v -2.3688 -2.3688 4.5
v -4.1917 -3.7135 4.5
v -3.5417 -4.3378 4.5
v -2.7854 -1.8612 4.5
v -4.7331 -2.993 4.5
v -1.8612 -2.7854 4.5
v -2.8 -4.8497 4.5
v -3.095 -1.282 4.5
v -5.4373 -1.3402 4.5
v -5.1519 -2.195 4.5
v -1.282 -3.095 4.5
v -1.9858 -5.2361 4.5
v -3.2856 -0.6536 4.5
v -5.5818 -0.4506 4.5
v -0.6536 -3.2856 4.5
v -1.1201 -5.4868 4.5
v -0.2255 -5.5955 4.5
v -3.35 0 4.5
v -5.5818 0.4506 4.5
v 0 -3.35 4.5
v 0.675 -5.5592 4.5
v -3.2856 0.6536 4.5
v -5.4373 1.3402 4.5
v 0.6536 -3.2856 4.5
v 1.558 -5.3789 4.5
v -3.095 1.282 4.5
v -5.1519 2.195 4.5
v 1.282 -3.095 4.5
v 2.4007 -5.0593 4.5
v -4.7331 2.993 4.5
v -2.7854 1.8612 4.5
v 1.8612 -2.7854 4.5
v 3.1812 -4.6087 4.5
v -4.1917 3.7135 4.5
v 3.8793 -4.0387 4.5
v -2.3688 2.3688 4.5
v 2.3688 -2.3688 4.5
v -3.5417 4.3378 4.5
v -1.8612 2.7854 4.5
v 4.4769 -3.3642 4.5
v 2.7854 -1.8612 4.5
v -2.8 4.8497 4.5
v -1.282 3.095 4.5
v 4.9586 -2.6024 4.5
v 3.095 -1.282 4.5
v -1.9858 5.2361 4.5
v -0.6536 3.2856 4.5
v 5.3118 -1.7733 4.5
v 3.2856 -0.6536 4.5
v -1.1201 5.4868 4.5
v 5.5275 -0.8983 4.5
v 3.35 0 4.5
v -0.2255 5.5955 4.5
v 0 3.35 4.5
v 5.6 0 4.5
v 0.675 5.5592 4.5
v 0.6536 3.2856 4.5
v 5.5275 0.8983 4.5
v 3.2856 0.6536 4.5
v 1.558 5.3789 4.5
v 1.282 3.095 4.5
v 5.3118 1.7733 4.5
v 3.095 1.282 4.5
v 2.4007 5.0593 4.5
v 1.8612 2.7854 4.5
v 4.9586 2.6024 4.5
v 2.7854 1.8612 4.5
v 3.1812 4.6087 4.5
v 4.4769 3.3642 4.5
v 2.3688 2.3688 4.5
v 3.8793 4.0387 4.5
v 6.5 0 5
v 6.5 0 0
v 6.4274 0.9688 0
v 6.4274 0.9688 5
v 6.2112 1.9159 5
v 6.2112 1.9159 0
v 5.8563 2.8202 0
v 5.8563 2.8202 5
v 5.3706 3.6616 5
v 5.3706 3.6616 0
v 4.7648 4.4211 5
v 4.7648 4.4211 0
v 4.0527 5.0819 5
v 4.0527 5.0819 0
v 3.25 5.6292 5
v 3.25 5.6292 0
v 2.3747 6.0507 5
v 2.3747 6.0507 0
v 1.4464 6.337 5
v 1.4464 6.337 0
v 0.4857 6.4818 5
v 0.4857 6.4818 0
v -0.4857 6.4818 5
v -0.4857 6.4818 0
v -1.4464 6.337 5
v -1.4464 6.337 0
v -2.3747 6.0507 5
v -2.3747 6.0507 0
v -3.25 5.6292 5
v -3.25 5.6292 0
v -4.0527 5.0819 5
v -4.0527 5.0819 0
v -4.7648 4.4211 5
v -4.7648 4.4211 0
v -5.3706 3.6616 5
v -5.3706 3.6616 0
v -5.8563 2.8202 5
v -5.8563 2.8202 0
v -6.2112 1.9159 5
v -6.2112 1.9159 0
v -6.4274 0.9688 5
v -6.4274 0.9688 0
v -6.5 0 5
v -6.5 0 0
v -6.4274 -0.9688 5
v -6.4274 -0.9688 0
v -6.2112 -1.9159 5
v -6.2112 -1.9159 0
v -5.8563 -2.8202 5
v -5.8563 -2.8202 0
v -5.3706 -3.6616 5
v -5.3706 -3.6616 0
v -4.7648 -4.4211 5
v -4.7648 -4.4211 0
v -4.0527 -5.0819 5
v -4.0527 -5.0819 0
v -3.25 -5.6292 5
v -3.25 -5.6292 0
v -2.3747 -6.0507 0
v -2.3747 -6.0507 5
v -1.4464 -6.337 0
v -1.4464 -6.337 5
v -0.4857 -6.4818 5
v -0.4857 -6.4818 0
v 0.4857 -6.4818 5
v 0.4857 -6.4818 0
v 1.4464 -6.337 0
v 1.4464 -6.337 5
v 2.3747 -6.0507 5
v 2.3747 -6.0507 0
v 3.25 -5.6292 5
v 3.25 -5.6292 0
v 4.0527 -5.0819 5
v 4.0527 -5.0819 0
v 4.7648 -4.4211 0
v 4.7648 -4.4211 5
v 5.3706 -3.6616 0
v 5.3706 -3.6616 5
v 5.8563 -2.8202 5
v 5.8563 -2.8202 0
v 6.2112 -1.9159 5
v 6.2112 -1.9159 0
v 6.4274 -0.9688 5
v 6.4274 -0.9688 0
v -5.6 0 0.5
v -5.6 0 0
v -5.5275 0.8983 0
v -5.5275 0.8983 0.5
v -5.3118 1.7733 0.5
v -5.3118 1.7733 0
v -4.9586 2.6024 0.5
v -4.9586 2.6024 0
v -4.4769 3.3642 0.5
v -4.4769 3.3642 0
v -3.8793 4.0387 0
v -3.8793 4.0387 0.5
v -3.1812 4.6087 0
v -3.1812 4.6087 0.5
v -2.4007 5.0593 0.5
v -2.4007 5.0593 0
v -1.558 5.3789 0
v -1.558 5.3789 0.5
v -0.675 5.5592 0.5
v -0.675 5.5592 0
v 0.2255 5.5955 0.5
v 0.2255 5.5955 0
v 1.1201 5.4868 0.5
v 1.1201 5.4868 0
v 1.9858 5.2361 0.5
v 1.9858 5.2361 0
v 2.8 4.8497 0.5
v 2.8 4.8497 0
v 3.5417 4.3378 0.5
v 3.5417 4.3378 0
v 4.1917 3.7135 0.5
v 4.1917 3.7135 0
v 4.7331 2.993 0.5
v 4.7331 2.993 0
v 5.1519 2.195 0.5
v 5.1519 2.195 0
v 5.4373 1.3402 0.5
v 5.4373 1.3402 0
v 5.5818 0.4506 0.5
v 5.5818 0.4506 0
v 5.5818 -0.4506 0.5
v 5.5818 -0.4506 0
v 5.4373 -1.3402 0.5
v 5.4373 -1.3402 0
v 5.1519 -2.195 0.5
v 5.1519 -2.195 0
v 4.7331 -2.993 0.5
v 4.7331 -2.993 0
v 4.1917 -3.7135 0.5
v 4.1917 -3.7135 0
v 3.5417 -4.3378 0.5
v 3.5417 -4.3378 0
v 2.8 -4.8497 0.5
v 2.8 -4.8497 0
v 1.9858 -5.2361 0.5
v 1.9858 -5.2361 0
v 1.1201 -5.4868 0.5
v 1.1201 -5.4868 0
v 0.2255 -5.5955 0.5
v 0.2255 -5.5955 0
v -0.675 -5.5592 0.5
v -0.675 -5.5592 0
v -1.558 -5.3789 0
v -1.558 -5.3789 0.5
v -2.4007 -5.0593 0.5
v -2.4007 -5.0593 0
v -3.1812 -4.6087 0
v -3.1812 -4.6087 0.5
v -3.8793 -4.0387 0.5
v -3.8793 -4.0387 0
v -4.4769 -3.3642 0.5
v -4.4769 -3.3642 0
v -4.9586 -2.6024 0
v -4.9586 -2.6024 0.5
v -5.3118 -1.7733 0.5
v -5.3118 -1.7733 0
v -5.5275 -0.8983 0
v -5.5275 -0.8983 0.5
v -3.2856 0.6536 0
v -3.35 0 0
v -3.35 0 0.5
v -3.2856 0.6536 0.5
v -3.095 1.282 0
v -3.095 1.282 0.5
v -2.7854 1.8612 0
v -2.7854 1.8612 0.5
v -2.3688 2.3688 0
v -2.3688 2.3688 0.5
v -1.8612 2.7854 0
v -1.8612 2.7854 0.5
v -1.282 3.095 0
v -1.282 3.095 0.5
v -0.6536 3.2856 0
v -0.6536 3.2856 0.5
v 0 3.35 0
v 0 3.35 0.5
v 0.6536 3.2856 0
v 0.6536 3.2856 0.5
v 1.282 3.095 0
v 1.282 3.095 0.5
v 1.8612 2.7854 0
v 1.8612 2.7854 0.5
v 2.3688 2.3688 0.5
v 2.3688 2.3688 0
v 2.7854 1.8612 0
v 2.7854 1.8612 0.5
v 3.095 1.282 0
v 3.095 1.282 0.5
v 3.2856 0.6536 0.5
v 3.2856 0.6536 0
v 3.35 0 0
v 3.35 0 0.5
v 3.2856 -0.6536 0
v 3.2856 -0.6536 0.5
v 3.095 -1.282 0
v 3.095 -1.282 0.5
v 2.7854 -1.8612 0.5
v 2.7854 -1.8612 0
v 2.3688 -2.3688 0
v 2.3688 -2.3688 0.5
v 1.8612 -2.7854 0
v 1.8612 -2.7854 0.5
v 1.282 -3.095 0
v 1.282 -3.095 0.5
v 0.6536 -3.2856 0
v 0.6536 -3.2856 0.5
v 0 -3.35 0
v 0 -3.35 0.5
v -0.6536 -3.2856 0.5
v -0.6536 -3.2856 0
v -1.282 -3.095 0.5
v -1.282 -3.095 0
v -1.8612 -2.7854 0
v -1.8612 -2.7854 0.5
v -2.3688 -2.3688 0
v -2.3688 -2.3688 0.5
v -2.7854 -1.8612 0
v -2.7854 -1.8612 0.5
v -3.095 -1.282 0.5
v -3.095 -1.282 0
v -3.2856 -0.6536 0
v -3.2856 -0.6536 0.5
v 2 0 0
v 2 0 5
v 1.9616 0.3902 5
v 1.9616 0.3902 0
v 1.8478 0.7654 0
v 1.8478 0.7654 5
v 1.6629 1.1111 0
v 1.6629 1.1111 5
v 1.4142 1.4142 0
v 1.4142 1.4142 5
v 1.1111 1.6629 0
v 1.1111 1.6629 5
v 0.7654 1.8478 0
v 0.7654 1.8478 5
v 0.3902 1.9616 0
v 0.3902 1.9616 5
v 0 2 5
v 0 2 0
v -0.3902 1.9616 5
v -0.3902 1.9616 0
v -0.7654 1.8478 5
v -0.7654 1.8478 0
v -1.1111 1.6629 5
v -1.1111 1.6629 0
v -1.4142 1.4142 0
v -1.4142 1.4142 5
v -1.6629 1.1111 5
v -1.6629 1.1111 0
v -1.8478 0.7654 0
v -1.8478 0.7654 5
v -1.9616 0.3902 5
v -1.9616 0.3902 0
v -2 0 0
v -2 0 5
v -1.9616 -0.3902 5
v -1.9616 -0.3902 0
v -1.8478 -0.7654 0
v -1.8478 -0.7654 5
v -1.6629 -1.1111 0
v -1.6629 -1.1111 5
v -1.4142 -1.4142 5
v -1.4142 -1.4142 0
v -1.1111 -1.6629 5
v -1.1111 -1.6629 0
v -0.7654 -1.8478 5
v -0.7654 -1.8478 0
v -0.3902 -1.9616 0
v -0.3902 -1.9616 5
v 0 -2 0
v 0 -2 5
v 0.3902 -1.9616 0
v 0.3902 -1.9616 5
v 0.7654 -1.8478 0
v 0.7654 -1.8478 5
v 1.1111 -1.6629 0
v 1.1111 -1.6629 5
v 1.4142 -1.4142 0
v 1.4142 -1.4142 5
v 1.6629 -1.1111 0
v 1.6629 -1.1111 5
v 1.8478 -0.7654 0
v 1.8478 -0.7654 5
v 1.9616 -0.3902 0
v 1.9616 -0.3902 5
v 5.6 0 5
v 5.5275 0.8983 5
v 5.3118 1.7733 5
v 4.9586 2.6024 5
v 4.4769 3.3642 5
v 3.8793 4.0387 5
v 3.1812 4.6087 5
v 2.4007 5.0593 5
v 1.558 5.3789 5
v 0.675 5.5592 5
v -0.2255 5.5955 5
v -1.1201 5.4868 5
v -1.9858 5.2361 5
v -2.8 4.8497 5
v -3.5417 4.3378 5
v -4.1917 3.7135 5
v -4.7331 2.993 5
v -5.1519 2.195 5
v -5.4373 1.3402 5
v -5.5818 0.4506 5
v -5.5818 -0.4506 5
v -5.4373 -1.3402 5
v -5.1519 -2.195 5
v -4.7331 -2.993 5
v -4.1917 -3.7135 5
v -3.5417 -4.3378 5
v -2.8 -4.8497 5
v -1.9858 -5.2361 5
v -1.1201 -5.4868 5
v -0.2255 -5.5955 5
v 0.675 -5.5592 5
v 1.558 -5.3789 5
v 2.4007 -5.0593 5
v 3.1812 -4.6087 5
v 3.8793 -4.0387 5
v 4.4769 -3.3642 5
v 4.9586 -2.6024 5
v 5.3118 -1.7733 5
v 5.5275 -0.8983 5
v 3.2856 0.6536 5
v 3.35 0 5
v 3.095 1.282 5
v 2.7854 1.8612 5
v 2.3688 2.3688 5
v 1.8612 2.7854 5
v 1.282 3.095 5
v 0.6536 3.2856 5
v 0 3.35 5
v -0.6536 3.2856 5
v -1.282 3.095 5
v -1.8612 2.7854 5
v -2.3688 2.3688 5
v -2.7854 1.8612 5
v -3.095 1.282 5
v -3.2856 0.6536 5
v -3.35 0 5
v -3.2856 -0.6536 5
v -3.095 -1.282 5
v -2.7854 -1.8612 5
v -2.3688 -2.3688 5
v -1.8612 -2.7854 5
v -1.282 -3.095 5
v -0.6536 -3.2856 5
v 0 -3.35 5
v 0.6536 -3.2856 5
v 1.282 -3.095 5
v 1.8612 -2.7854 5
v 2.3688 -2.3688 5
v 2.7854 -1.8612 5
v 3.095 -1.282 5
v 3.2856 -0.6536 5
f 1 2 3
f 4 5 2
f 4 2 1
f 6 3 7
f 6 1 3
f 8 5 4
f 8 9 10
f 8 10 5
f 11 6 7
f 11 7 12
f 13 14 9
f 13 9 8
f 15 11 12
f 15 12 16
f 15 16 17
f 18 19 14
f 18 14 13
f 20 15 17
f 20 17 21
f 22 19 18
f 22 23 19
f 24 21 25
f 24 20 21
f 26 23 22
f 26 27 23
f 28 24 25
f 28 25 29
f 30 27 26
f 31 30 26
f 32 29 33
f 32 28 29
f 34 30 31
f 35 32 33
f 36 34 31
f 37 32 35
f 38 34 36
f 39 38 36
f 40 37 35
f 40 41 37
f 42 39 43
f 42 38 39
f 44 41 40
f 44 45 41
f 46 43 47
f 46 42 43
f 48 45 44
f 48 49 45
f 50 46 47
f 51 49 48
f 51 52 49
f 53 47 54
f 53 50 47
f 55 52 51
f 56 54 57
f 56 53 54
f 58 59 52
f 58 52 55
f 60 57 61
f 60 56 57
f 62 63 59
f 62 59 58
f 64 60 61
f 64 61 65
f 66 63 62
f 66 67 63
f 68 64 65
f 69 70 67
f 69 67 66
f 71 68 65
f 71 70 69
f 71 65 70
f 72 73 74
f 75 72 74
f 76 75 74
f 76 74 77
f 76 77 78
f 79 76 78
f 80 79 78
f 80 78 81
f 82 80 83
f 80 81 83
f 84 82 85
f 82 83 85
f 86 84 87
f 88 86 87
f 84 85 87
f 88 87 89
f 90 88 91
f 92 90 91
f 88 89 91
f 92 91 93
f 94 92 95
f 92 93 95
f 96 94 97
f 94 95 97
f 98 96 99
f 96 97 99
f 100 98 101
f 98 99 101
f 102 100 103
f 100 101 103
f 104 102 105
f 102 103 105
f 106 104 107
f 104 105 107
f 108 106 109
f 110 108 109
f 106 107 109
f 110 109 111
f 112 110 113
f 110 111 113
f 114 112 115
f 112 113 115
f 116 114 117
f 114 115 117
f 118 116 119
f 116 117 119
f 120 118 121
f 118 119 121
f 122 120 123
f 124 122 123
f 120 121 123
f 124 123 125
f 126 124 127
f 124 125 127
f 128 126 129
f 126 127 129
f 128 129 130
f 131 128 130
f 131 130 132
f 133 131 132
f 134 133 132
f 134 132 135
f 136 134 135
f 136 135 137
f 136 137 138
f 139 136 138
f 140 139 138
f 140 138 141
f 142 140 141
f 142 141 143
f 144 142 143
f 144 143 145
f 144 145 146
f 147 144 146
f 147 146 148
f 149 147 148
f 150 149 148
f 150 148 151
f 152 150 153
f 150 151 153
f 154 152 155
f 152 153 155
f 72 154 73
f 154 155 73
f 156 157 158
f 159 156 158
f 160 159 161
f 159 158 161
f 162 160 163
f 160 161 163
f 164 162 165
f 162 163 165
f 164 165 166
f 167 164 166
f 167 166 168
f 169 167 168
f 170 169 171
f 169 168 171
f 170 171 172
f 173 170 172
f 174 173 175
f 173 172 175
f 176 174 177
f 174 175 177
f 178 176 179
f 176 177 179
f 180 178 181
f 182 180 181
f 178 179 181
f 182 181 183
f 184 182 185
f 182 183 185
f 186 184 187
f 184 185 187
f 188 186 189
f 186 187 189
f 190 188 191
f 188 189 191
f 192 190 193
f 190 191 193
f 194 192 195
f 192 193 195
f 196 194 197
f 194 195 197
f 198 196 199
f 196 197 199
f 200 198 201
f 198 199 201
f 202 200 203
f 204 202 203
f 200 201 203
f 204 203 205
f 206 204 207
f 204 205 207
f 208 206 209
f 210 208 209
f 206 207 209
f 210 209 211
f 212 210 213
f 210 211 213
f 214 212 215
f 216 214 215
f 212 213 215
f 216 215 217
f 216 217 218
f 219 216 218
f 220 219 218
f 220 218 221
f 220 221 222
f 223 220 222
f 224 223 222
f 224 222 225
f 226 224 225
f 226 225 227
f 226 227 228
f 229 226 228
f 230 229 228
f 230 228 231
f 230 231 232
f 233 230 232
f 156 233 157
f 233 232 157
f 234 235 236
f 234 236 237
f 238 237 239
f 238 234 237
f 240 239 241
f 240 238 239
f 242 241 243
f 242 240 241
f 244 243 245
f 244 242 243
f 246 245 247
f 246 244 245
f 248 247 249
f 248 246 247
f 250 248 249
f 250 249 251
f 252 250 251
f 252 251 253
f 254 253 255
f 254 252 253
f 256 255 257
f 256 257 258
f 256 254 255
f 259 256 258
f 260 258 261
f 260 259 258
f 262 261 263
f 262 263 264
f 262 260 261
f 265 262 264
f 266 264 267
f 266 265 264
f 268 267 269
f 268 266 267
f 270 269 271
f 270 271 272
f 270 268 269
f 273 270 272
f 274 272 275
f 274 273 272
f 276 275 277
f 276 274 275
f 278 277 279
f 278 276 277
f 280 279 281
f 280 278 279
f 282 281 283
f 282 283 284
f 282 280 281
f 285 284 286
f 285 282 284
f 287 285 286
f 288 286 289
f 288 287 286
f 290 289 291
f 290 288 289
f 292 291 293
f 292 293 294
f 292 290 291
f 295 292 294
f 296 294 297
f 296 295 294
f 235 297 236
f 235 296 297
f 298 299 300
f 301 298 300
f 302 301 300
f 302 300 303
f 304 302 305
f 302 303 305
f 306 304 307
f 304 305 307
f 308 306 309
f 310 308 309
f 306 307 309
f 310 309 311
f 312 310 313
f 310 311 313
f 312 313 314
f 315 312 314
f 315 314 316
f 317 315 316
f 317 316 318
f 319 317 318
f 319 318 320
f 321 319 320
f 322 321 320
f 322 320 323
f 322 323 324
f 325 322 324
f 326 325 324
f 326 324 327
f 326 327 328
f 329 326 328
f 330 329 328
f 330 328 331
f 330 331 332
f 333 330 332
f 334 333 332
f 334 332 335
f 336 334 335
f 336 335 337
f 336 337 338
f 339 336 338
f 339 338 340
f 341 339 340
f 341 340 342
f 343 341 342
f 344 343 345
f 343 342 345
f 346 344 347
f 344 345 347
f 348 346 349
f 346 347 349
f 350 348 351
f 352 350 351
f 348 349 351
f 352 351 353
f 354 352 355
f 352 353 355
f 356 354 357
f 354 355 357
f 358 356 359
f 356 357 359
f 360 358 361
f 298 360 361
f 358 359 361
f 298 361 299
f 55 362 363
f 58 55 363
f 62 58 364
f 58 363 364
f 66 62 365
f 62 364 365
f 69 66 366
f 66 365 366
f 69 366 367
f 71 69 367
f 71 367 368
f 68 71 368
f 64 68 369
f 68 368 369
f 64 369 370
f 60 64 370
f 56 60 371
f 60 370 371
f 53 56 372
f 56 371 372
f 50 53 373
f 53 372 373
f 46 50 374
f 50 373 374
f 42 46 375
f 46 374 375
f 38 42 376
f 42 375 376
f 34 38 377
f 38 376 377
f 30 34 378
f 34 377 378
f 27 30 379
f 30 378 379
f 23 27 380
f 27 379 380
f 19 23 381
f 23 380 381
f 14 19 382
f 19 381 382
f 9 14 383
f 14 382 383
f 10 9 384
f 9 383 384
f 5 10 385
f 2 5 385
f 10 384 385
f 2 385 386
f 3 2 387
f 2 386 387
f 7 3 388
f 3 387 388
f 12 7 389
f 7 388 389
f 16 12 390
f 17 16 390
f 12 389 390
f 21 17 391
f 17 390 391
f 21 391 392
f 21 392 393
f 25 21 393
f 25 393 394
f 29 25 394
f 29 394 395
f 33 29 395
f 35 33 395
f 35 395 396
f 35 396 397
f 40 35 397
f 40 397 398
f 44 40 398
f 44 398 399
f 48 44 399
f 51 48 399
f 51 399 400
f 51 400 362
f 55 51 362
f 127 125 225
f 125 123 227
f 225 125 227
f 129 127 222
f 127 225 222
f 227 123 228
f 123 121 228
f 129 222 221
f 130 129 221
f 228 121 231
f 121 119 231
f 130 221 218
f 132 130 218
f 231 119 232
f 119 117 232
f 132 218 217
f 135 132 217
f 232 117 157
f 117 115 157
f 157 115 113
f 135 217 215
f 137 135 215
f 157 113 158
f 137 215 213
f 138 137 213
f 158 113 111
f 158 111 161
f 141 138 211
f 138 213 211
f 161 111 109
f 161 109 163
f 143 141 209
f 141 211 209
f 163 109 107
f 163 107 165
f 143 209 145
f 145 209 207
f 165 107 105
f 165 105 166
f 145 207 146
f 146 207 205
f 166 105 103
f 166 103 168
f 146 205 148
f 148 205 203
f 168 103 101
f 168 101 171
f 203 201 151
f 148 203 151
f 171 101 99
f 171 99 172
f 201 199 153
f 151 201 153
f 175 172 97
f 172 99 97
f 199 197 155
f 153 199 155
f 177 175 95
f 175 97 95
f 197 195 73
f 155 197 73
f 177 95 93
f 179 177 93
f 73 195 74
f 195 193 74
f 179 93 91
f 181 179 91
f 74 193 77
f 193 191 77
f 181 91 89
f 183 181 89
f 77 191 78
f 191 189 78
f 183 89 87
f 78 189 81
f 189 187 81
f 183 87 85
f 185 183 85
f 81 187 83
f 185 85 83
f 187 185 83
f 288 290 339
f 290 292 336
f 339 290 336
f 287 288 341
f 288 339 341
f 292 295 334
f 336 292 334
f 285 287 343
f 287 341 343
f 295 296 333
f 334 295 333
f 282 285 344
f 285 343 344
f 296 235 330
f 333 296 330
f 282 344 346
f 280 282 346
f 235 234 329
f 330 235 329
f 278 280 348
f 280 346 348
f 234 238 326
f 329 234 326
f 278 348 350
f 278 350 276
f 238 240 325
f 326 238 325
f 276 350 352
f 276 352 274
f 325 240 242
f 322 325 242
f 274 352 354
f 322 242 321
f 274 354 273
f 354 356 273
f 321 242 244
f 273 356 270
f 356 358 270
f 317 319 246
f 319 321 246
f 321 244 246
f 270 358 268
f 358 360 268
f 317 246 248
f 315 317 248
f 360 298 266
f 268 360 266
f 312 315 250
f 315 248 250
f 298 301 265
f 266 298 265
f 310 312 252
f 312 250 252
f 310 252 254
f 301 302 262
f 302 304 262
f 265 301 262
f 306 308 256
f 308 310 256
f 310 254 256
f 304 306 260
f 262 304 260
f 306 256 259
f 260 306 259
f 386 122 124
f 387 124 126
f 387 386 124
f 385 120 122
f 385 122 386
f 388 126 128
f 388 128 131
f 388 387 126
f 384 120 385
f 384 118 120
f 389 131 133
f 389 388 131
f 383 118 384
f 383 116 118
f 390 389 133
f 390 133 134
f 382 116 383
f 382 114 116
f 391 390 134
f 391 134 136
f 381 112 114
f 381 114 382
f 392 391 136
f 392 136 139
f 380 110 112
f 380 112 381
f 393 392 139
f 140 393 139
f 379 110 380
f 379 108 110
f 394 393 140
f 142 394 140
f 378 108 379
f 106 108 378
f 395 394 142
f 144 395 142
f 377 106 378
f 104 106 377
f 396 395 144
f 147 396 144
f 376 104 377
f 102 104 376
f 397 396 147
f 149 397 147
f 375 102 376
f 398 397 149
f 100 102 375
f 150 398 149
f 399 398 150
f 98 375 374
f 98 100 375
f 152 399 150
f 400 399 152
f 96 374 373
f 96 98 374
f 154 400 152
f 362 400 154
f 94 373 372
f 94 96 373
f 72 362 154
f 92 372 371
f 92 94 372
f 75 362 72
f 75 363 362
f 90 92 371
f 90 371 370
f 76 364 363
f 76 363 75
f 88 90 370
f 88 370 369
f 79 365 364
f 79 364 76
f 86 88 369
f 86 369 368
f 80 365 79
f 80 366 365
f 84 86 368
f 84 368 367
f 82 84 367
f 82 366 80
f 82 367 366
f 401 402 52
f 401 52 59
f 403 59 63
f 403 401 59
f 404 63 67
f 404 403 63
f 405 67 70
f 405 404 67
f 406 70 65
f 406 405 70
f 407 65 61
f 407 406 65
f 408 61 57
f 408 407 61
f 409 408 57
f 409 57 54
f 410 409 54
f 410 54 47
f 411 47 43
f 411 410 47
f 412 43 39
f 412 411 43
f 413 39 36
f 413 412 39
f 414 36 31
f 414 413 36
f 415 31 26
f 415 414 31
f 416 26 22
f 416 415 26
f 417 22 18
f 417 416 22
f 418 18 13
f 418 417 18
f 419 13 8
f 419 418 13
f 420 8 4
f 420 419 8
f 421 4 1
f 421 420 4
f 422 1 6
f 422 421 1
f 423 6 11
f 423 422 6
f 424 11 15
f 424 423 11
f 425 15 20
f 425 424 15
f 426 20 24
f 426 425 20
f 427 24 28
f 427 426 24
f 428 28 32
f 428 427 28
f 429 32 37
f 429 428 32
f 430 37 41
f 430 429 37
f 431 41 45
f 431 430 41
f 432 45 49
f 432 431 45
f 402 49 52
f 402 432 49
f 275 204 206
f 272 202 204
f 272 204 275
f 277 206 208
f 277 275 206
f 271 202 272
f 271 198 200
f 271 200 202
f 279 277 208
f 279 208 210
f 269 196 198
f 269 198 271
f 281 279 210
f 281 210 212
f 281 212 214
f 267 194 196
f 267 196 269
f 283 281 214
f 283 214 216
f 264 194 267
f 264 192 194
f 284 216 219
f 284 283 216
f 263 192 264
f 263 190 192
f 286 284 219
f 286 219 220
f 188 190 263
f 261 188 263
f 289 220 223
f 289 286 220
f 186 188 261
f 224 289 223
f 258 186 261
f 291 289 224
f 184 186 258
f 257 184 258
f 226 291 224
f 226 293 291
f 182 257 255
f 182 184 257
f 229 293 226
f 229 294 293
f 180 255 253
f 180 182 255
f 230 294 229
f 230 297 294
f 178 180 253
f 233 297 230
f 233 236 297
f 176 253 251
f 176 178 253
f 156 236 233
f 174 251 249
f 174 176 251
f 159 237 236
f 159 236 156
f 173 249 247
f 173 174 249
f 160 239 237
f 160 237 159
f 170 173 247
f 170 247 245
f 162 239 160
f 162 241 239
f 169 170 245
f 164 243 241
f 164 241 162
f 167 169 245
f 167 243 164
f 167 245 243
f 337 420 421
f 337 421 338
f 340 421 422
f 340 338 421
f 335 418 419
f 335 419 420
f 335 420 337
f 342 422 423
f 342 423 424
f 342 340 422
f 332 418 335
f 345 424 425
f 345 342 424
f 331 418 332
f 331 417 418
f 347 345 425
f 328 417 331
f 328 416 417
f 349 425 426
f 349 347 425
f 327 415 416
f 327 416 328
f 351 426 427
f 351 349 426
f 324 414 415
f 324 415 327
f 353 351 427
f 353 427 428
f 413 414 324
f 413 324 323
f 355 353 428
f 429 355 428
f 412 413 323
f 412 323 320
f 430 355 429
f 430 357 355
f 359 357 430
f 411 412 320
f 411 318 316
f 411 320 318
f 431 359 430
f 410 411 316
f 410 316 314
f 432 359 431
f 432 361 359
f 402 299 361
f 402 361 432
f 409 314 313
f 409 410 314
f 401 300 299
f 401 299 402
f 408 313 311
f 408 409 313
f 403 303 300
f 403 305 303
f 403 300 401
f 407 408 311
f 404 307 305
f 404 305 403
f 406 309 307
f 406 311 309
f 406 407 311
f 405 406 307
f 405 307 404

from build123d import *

# Parameters (mm, degrees)
SKETCH_1_R          = 6.5
EXTRUDE_1_DEPTH     = 5
SKETCH_2_R          = 2
CUT_EXTRUDE_1_DEPTH = 6
SKETCH_3_R          = 5.6
SKETCH_3_R_2        = 3.35
CUT_EXTRUDE_2_DEPTH = 0.5
SKETCH_4_R          = 5.6
SKETCH_4_R_2        = 3.35
CUT_EXTRUDE_3_DEPTH = 0.5


with BuildPart() as part:
    # 草圖1 → 填料-伸長1 (new body)
    with BuildSketch(Plane.XY):
        Circle(SKETCH_1_R)
    extrude(amount=EXTRUDE_1_DEPTH)

    # 草圖2 → 除料-伸長1 (cut, through all)
    with BuildSketch(Plane.XY.offset(5)):
        Circle(SKETCH_2_R)
    extrude(amount=-CUT_EXTRUDE_1_DEPTH, mode=Mode.SUBTRACT)

    # 草圖3 → 除料-伸長2 (cut)
    with BuildSketch(Plane.XY.offset(5)):
        Circle(SKETCH_3_R)
        Circle(SKETCH_3_R_2, mode=Mode.SUBTRACT)
    extrude(amount=-CUT_EXTRUDE_2_DEPTH, mode=Mode.SUBTRACT)

    # 草圖4 → 除料-伸長3 (cut)
    with BuildSketch(Plane(origin=(0, 0, 0), x_dir=(-1, 0, 0), z_dir=(0, 0, -1))):
        Circle(SKETCH_4_R)
        Circle(SKETCH_4_R_2, mode=Mode.SUBTRACT)
    extrude(amount=-CUT_EXTRUDE_3_DEPTH, mode=Mode.SUBTRACT)


solid = part.part
